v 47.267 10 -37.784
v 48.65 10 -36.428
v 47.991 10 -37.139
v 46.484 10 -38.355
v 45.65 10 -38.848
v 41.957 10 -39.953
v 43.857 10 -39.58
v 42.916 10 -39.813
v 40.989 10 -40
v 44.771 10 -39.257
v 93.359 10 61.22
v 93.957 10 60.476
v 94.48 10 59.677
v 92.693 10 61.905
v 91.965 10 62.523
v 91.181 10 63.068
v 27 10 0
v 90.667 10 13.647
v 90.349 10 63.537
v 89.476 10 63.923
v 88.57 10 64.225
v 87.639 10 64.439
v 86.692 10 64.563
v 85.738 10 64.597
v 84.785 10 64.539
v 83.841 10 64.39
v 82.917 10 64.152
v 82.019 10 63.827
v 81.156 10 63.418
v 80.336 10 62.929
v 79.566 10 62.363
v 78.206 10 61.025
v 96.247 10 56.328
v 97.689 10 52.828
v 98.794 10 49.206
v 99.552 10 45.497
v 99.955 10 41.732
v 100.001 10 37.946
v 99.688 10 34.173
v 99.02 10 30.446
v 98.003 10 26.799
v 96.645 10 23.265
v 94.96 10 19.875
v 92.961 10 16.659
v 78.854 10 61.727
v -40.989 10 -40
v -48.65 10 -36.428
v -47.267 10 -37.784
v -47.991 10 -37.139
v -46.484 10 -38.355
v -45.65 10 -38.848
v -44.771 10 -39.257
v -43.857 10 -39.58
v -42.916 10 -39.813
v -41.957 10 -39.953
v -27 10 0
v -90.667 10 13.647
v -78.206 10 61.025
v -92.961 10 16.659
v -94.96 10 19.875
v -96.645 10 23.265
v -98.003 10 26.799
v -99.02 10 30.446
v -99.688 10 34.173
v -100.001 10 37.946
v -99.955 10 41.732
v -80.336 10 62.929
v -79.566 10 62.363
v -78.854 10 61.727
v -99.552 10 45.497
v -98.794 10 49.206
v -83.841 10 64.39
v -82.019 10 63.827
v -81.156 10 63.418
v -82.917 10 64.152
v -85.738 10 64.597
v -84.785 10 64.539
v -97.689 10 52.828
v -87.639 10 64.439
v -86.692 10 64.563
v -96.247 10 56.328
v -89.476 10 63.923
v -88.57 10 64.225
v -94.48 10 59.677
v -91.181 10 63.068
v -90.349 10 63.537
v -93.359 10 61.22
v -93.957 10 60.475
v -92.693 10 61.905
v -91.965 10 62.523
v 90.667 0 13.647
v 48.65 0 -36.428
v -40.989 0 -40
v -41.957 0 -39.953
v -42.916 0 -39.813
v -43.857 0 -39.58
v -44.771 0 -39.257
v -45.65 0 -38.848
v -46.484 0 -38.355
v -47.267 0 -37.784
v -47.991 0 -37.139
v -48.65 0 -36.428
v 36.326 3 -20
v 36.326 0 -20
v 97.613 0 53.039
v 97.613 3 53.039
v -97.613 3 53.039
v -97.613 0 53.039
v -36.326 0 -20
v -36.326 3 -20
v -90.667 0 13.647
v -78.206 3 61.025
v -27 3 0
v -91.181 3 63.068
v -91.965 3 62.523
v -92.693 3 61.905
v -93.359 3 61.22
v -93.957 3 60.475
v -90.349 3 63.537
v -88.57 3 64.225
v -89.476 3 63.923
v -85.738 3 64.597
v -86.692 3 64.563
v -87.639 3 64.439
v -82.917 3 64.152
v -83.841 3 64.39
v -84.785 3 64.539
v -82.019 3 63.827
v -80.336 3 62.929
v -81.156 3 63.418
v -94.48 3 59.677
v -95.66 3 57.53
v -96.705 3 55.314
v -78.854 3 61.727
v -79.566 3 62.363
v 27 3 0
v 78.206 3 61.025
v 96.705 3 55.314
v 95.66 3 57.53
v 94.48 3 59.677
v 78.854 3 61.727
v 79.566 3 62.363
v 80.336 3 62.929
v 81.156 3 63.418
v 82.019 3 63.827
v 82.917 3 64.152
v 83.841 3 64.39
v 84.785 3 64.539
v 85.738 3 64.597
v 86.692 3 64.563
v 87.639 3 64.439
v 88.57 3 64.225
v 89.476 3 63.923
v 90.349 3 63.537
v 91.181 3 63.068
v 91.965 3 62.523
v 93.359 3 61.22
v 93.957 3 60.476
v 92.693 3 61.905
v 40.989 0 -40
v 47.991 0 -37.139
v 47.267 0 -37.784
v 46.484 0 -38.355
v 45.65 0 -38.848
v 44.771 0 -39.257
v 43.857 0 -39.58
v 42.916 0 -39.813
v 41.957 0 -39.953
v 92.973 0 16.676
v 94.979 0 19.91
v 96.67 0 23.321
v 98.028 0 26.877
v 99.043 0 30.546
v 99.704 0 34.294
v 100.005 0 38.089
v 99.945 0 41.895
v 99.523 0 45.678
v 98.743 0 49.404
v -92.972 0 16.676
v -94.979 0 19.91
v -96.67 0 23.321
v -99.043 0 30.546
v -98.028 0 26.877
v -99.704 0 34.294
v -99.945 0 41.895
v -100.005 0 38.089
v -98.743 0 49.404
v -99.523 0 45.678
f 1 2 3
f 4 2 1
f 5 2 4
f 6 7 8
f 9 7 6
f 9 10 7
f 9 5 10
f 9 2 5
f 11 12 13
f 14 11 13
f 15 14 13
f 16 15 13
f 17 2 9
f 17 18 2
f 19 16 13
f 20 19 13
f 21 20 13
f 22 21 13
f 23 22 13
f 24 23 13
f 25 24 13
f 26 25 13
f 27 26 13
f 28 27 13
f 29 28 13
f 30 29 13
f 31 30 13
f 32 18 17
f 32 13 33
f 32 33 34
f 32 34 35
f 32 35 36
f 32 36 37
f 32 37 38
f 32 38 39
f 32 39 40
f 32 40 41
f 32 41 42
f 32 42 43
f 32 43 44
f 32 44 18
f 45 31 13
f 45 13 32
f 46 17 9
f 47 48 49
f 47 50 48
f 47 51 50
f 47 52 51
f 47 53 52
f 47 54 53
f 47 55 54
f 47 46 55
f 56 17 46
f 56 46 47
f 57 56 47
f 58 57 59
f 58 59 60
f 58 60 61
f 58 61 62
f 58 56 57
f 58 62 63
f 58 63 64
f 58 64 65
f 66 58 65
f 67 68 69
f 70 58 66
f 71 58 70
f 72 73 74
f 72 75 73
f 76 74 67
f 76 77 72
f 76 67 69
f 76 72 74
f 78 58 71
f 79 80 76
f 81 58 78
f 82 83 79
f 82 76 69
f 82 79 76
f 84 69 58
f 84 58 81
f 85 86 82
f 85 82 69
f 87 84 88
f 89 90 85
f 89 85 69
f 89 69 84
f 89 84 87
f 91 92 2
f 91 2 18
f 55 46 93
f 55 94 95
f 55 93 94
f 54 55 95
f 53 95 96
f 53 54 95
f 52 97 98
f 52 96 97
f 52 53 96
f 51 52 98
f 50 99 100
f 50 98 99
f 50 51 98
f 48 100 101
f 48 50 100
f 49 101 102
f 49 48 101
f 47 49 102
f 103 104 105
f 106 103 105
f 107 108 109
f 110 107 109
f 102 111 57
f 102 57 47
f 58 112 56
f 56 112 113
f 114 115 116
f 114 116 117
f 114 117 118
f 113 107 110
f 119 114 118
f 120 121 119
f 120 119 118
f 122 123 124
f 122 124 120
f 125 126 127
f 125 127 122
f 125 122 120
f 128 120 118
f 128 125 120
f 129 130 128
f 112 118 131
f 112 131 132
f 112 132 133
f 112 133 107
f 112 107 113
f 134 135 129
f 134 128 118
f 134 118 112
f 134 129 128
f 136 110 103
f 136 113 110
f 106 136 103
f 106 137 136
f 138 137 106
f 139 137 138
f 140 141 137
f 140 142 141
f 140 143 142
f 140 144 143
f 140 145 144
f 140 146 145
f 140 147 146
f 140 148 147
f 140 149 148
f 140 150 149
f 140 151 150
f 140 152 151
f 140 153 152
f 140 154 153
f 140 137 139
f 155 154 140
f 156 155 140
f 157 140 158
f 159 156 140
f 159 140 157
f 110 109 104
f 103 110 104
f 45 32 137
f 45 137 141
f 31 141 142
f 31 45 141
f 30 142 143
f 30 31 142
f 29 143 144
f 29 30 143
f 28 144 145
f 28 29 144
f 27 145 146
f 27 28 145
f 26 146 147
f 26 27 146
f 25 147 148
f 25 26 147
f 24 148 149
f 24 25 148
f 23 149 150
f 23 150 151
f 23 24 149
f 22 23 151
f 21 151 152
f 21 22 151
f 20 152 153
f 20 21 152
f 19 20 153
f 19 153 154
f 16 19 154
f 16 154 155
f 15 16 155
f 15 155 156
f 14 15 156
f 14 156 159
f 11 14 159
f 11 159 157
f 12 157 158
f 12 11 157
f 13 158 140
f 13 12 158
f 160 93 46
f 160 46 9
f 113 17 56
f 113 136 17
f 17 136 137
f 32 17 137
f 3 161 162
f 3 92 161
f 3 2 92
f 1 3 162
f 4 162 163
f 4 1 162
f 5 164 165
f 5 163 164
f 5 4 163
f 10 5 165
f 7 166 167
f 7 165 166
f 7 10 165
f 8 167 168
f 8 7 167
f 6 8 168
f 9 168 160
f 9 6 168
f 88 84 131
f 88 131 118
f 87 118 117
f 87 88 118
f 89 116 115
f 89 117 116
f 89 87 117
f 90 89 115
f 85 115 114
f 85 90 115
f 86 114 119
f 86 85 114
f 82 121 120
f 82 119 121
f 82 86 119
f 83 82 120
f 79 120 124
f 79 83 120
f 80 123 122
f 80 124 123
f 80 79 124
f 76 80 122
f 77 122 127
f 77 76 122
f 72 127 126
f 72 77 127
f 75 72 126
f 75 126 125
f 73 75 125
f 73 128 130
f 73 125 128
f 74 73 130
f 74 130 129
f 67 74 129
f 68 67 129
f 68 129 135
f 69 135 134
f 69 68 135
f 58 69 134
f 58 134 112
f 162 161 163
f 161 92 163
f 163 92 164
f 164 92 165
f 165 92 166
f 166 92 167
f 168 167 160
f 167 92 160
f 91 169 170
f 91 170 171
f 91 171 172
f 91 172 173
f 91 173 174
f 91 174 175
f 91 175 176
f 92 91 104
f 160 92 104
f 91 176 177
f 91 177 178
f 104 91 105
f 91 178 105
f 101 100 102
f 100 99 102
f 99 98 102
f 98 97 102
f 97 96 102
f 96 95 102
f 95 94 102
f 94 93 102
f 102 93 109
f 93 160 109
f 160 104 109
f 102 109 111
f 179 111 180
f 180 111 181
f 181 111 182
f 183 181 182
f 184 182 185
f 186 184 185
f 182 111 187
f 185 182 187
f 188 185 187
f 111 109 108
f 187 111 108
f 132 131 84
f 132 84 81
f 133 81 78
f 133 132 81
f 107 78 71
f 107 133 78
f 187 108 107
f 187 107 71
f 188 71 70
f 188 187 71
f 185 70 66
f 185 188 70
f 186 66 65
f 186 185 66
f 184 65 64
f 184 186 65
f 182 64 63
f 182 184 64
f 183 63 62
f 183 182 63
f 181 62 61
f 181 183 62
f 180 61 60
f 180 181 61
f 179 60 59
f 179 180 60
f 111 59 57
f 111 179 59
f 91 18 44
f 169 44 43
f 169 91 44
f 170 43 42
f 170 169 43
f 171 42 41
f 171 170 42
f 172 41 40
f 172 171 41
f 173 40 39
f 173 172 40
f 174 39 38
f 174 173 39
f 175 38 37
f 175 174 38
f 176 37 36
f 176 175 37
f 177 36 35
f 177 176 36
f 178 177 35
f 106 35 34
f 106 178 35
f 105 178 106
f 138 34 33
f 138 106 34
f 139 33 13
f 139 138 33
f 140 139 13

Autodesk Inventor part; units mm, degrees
ref_plane "YZ Plane" through (0, 0, 0) normal (1, 0, 0) x (0, 1, 0)
ref_plane "XZ Plane" through (0, 0, 0) normal (0, 1, 0) x (-1, 0, 0)
ref_plane "XY Plane" through (0, 0, 0) normal (0, 0, 1) x (1, 0, 0)
sketch "Sketch1" plane through (0, 0, 0) normal (0, 1, 0) x (-1, 0, 0)
  line L0 (-27, 0) -> (27, 0)
  line L1 (-27, 0) -> (-85.737, 70)
  line L2 (85.737, 70) -> (27, 0)
  line L3 (90.6672, 13.6467) -> (45.6523, -40)
  line L4 (45.6523, -40) -> (-45.6523, -40)
  line L5 (-45.6523, -40) -> (-90.6672, 13.6467)
  line L6 (0, 0) -> (0, -40) construction
  arc A0 (90.6672, 13.6467) -> (85.737, 70) centre (60.0255, 39.3582) ccw
  arc A1 (-85.737, 70) -> (-90.6672, 13.6467) centre (-60.0255, 39.3582) ccw
  point P0 (0, 70)
  dimension "d1" = 54
  dimension "d3" = 40
  dimension "d5" = 40
  dimension "d16" = 130
  dimension "d17" = 70
extrude "Extrusion1" add sketch "Sketch1" along normal blind 10
sketch "Sketch2" plane through (0, 0, 0) normal (0, -1, 0) x (1, 0, 0)
  line L0 (-27, 0) -> (27, 0) projected
  line L1 (-85.737, 70) -> (-27, 0) projected
  line L2 (-45.6523, -40) -> (-90.6672, 13.6467) construction
  line L3 (45.6523, -40) -> (-45.6523, -40) construction
  line L4 (90.6672, 13.6467) -> (45.6523, -40) construction
  line L5 (27, 0) -> (85.737, 70) projected
  line L6 (-97.6132, 53.039) -> (-36.3262, -20)
  line L7 (-36.3262, -20) -> (36.3262, -20)
  line L8 (36.3262, -20) -> (97.6132, 53.039)
  line L9 (-85.737, 70) -> (-27, 0) projected
  line L10 (27, 0) -> (85.737, 70) projected
  arc A0 (-85.737, 70) -> (-90.6672, 13.6467) centre (-60.0255, 39.3582) ccw projected
  arc A1 (90.6672, 13.6467) -> (85.737, 70) centre (60.0255, 39.3582) ccw projected
  point P0 (0, 0)
  dimension "d8" = 20
  dimension "d9" = 20
  dimension "d10" = 20
extrude "Extrusion2" cut sketch "Sketch2" against normal blind 3
fillet "Fillet1" radius 10 4 edges at (-85.737, 6.5, 70) (85.737, 6.5, 70) (-45.6523, 5, -40) (45.6523, 5, -40)
equation "\"d5\" = d3"
equation "\"d16\" = Лоток_угол"
equation "\"d9\" = d8"
equation "\"d10\" = d8"
equation "\"Лоток_угол\" = 130deg"
properties part number "ДМС 045 держатель лотка"
